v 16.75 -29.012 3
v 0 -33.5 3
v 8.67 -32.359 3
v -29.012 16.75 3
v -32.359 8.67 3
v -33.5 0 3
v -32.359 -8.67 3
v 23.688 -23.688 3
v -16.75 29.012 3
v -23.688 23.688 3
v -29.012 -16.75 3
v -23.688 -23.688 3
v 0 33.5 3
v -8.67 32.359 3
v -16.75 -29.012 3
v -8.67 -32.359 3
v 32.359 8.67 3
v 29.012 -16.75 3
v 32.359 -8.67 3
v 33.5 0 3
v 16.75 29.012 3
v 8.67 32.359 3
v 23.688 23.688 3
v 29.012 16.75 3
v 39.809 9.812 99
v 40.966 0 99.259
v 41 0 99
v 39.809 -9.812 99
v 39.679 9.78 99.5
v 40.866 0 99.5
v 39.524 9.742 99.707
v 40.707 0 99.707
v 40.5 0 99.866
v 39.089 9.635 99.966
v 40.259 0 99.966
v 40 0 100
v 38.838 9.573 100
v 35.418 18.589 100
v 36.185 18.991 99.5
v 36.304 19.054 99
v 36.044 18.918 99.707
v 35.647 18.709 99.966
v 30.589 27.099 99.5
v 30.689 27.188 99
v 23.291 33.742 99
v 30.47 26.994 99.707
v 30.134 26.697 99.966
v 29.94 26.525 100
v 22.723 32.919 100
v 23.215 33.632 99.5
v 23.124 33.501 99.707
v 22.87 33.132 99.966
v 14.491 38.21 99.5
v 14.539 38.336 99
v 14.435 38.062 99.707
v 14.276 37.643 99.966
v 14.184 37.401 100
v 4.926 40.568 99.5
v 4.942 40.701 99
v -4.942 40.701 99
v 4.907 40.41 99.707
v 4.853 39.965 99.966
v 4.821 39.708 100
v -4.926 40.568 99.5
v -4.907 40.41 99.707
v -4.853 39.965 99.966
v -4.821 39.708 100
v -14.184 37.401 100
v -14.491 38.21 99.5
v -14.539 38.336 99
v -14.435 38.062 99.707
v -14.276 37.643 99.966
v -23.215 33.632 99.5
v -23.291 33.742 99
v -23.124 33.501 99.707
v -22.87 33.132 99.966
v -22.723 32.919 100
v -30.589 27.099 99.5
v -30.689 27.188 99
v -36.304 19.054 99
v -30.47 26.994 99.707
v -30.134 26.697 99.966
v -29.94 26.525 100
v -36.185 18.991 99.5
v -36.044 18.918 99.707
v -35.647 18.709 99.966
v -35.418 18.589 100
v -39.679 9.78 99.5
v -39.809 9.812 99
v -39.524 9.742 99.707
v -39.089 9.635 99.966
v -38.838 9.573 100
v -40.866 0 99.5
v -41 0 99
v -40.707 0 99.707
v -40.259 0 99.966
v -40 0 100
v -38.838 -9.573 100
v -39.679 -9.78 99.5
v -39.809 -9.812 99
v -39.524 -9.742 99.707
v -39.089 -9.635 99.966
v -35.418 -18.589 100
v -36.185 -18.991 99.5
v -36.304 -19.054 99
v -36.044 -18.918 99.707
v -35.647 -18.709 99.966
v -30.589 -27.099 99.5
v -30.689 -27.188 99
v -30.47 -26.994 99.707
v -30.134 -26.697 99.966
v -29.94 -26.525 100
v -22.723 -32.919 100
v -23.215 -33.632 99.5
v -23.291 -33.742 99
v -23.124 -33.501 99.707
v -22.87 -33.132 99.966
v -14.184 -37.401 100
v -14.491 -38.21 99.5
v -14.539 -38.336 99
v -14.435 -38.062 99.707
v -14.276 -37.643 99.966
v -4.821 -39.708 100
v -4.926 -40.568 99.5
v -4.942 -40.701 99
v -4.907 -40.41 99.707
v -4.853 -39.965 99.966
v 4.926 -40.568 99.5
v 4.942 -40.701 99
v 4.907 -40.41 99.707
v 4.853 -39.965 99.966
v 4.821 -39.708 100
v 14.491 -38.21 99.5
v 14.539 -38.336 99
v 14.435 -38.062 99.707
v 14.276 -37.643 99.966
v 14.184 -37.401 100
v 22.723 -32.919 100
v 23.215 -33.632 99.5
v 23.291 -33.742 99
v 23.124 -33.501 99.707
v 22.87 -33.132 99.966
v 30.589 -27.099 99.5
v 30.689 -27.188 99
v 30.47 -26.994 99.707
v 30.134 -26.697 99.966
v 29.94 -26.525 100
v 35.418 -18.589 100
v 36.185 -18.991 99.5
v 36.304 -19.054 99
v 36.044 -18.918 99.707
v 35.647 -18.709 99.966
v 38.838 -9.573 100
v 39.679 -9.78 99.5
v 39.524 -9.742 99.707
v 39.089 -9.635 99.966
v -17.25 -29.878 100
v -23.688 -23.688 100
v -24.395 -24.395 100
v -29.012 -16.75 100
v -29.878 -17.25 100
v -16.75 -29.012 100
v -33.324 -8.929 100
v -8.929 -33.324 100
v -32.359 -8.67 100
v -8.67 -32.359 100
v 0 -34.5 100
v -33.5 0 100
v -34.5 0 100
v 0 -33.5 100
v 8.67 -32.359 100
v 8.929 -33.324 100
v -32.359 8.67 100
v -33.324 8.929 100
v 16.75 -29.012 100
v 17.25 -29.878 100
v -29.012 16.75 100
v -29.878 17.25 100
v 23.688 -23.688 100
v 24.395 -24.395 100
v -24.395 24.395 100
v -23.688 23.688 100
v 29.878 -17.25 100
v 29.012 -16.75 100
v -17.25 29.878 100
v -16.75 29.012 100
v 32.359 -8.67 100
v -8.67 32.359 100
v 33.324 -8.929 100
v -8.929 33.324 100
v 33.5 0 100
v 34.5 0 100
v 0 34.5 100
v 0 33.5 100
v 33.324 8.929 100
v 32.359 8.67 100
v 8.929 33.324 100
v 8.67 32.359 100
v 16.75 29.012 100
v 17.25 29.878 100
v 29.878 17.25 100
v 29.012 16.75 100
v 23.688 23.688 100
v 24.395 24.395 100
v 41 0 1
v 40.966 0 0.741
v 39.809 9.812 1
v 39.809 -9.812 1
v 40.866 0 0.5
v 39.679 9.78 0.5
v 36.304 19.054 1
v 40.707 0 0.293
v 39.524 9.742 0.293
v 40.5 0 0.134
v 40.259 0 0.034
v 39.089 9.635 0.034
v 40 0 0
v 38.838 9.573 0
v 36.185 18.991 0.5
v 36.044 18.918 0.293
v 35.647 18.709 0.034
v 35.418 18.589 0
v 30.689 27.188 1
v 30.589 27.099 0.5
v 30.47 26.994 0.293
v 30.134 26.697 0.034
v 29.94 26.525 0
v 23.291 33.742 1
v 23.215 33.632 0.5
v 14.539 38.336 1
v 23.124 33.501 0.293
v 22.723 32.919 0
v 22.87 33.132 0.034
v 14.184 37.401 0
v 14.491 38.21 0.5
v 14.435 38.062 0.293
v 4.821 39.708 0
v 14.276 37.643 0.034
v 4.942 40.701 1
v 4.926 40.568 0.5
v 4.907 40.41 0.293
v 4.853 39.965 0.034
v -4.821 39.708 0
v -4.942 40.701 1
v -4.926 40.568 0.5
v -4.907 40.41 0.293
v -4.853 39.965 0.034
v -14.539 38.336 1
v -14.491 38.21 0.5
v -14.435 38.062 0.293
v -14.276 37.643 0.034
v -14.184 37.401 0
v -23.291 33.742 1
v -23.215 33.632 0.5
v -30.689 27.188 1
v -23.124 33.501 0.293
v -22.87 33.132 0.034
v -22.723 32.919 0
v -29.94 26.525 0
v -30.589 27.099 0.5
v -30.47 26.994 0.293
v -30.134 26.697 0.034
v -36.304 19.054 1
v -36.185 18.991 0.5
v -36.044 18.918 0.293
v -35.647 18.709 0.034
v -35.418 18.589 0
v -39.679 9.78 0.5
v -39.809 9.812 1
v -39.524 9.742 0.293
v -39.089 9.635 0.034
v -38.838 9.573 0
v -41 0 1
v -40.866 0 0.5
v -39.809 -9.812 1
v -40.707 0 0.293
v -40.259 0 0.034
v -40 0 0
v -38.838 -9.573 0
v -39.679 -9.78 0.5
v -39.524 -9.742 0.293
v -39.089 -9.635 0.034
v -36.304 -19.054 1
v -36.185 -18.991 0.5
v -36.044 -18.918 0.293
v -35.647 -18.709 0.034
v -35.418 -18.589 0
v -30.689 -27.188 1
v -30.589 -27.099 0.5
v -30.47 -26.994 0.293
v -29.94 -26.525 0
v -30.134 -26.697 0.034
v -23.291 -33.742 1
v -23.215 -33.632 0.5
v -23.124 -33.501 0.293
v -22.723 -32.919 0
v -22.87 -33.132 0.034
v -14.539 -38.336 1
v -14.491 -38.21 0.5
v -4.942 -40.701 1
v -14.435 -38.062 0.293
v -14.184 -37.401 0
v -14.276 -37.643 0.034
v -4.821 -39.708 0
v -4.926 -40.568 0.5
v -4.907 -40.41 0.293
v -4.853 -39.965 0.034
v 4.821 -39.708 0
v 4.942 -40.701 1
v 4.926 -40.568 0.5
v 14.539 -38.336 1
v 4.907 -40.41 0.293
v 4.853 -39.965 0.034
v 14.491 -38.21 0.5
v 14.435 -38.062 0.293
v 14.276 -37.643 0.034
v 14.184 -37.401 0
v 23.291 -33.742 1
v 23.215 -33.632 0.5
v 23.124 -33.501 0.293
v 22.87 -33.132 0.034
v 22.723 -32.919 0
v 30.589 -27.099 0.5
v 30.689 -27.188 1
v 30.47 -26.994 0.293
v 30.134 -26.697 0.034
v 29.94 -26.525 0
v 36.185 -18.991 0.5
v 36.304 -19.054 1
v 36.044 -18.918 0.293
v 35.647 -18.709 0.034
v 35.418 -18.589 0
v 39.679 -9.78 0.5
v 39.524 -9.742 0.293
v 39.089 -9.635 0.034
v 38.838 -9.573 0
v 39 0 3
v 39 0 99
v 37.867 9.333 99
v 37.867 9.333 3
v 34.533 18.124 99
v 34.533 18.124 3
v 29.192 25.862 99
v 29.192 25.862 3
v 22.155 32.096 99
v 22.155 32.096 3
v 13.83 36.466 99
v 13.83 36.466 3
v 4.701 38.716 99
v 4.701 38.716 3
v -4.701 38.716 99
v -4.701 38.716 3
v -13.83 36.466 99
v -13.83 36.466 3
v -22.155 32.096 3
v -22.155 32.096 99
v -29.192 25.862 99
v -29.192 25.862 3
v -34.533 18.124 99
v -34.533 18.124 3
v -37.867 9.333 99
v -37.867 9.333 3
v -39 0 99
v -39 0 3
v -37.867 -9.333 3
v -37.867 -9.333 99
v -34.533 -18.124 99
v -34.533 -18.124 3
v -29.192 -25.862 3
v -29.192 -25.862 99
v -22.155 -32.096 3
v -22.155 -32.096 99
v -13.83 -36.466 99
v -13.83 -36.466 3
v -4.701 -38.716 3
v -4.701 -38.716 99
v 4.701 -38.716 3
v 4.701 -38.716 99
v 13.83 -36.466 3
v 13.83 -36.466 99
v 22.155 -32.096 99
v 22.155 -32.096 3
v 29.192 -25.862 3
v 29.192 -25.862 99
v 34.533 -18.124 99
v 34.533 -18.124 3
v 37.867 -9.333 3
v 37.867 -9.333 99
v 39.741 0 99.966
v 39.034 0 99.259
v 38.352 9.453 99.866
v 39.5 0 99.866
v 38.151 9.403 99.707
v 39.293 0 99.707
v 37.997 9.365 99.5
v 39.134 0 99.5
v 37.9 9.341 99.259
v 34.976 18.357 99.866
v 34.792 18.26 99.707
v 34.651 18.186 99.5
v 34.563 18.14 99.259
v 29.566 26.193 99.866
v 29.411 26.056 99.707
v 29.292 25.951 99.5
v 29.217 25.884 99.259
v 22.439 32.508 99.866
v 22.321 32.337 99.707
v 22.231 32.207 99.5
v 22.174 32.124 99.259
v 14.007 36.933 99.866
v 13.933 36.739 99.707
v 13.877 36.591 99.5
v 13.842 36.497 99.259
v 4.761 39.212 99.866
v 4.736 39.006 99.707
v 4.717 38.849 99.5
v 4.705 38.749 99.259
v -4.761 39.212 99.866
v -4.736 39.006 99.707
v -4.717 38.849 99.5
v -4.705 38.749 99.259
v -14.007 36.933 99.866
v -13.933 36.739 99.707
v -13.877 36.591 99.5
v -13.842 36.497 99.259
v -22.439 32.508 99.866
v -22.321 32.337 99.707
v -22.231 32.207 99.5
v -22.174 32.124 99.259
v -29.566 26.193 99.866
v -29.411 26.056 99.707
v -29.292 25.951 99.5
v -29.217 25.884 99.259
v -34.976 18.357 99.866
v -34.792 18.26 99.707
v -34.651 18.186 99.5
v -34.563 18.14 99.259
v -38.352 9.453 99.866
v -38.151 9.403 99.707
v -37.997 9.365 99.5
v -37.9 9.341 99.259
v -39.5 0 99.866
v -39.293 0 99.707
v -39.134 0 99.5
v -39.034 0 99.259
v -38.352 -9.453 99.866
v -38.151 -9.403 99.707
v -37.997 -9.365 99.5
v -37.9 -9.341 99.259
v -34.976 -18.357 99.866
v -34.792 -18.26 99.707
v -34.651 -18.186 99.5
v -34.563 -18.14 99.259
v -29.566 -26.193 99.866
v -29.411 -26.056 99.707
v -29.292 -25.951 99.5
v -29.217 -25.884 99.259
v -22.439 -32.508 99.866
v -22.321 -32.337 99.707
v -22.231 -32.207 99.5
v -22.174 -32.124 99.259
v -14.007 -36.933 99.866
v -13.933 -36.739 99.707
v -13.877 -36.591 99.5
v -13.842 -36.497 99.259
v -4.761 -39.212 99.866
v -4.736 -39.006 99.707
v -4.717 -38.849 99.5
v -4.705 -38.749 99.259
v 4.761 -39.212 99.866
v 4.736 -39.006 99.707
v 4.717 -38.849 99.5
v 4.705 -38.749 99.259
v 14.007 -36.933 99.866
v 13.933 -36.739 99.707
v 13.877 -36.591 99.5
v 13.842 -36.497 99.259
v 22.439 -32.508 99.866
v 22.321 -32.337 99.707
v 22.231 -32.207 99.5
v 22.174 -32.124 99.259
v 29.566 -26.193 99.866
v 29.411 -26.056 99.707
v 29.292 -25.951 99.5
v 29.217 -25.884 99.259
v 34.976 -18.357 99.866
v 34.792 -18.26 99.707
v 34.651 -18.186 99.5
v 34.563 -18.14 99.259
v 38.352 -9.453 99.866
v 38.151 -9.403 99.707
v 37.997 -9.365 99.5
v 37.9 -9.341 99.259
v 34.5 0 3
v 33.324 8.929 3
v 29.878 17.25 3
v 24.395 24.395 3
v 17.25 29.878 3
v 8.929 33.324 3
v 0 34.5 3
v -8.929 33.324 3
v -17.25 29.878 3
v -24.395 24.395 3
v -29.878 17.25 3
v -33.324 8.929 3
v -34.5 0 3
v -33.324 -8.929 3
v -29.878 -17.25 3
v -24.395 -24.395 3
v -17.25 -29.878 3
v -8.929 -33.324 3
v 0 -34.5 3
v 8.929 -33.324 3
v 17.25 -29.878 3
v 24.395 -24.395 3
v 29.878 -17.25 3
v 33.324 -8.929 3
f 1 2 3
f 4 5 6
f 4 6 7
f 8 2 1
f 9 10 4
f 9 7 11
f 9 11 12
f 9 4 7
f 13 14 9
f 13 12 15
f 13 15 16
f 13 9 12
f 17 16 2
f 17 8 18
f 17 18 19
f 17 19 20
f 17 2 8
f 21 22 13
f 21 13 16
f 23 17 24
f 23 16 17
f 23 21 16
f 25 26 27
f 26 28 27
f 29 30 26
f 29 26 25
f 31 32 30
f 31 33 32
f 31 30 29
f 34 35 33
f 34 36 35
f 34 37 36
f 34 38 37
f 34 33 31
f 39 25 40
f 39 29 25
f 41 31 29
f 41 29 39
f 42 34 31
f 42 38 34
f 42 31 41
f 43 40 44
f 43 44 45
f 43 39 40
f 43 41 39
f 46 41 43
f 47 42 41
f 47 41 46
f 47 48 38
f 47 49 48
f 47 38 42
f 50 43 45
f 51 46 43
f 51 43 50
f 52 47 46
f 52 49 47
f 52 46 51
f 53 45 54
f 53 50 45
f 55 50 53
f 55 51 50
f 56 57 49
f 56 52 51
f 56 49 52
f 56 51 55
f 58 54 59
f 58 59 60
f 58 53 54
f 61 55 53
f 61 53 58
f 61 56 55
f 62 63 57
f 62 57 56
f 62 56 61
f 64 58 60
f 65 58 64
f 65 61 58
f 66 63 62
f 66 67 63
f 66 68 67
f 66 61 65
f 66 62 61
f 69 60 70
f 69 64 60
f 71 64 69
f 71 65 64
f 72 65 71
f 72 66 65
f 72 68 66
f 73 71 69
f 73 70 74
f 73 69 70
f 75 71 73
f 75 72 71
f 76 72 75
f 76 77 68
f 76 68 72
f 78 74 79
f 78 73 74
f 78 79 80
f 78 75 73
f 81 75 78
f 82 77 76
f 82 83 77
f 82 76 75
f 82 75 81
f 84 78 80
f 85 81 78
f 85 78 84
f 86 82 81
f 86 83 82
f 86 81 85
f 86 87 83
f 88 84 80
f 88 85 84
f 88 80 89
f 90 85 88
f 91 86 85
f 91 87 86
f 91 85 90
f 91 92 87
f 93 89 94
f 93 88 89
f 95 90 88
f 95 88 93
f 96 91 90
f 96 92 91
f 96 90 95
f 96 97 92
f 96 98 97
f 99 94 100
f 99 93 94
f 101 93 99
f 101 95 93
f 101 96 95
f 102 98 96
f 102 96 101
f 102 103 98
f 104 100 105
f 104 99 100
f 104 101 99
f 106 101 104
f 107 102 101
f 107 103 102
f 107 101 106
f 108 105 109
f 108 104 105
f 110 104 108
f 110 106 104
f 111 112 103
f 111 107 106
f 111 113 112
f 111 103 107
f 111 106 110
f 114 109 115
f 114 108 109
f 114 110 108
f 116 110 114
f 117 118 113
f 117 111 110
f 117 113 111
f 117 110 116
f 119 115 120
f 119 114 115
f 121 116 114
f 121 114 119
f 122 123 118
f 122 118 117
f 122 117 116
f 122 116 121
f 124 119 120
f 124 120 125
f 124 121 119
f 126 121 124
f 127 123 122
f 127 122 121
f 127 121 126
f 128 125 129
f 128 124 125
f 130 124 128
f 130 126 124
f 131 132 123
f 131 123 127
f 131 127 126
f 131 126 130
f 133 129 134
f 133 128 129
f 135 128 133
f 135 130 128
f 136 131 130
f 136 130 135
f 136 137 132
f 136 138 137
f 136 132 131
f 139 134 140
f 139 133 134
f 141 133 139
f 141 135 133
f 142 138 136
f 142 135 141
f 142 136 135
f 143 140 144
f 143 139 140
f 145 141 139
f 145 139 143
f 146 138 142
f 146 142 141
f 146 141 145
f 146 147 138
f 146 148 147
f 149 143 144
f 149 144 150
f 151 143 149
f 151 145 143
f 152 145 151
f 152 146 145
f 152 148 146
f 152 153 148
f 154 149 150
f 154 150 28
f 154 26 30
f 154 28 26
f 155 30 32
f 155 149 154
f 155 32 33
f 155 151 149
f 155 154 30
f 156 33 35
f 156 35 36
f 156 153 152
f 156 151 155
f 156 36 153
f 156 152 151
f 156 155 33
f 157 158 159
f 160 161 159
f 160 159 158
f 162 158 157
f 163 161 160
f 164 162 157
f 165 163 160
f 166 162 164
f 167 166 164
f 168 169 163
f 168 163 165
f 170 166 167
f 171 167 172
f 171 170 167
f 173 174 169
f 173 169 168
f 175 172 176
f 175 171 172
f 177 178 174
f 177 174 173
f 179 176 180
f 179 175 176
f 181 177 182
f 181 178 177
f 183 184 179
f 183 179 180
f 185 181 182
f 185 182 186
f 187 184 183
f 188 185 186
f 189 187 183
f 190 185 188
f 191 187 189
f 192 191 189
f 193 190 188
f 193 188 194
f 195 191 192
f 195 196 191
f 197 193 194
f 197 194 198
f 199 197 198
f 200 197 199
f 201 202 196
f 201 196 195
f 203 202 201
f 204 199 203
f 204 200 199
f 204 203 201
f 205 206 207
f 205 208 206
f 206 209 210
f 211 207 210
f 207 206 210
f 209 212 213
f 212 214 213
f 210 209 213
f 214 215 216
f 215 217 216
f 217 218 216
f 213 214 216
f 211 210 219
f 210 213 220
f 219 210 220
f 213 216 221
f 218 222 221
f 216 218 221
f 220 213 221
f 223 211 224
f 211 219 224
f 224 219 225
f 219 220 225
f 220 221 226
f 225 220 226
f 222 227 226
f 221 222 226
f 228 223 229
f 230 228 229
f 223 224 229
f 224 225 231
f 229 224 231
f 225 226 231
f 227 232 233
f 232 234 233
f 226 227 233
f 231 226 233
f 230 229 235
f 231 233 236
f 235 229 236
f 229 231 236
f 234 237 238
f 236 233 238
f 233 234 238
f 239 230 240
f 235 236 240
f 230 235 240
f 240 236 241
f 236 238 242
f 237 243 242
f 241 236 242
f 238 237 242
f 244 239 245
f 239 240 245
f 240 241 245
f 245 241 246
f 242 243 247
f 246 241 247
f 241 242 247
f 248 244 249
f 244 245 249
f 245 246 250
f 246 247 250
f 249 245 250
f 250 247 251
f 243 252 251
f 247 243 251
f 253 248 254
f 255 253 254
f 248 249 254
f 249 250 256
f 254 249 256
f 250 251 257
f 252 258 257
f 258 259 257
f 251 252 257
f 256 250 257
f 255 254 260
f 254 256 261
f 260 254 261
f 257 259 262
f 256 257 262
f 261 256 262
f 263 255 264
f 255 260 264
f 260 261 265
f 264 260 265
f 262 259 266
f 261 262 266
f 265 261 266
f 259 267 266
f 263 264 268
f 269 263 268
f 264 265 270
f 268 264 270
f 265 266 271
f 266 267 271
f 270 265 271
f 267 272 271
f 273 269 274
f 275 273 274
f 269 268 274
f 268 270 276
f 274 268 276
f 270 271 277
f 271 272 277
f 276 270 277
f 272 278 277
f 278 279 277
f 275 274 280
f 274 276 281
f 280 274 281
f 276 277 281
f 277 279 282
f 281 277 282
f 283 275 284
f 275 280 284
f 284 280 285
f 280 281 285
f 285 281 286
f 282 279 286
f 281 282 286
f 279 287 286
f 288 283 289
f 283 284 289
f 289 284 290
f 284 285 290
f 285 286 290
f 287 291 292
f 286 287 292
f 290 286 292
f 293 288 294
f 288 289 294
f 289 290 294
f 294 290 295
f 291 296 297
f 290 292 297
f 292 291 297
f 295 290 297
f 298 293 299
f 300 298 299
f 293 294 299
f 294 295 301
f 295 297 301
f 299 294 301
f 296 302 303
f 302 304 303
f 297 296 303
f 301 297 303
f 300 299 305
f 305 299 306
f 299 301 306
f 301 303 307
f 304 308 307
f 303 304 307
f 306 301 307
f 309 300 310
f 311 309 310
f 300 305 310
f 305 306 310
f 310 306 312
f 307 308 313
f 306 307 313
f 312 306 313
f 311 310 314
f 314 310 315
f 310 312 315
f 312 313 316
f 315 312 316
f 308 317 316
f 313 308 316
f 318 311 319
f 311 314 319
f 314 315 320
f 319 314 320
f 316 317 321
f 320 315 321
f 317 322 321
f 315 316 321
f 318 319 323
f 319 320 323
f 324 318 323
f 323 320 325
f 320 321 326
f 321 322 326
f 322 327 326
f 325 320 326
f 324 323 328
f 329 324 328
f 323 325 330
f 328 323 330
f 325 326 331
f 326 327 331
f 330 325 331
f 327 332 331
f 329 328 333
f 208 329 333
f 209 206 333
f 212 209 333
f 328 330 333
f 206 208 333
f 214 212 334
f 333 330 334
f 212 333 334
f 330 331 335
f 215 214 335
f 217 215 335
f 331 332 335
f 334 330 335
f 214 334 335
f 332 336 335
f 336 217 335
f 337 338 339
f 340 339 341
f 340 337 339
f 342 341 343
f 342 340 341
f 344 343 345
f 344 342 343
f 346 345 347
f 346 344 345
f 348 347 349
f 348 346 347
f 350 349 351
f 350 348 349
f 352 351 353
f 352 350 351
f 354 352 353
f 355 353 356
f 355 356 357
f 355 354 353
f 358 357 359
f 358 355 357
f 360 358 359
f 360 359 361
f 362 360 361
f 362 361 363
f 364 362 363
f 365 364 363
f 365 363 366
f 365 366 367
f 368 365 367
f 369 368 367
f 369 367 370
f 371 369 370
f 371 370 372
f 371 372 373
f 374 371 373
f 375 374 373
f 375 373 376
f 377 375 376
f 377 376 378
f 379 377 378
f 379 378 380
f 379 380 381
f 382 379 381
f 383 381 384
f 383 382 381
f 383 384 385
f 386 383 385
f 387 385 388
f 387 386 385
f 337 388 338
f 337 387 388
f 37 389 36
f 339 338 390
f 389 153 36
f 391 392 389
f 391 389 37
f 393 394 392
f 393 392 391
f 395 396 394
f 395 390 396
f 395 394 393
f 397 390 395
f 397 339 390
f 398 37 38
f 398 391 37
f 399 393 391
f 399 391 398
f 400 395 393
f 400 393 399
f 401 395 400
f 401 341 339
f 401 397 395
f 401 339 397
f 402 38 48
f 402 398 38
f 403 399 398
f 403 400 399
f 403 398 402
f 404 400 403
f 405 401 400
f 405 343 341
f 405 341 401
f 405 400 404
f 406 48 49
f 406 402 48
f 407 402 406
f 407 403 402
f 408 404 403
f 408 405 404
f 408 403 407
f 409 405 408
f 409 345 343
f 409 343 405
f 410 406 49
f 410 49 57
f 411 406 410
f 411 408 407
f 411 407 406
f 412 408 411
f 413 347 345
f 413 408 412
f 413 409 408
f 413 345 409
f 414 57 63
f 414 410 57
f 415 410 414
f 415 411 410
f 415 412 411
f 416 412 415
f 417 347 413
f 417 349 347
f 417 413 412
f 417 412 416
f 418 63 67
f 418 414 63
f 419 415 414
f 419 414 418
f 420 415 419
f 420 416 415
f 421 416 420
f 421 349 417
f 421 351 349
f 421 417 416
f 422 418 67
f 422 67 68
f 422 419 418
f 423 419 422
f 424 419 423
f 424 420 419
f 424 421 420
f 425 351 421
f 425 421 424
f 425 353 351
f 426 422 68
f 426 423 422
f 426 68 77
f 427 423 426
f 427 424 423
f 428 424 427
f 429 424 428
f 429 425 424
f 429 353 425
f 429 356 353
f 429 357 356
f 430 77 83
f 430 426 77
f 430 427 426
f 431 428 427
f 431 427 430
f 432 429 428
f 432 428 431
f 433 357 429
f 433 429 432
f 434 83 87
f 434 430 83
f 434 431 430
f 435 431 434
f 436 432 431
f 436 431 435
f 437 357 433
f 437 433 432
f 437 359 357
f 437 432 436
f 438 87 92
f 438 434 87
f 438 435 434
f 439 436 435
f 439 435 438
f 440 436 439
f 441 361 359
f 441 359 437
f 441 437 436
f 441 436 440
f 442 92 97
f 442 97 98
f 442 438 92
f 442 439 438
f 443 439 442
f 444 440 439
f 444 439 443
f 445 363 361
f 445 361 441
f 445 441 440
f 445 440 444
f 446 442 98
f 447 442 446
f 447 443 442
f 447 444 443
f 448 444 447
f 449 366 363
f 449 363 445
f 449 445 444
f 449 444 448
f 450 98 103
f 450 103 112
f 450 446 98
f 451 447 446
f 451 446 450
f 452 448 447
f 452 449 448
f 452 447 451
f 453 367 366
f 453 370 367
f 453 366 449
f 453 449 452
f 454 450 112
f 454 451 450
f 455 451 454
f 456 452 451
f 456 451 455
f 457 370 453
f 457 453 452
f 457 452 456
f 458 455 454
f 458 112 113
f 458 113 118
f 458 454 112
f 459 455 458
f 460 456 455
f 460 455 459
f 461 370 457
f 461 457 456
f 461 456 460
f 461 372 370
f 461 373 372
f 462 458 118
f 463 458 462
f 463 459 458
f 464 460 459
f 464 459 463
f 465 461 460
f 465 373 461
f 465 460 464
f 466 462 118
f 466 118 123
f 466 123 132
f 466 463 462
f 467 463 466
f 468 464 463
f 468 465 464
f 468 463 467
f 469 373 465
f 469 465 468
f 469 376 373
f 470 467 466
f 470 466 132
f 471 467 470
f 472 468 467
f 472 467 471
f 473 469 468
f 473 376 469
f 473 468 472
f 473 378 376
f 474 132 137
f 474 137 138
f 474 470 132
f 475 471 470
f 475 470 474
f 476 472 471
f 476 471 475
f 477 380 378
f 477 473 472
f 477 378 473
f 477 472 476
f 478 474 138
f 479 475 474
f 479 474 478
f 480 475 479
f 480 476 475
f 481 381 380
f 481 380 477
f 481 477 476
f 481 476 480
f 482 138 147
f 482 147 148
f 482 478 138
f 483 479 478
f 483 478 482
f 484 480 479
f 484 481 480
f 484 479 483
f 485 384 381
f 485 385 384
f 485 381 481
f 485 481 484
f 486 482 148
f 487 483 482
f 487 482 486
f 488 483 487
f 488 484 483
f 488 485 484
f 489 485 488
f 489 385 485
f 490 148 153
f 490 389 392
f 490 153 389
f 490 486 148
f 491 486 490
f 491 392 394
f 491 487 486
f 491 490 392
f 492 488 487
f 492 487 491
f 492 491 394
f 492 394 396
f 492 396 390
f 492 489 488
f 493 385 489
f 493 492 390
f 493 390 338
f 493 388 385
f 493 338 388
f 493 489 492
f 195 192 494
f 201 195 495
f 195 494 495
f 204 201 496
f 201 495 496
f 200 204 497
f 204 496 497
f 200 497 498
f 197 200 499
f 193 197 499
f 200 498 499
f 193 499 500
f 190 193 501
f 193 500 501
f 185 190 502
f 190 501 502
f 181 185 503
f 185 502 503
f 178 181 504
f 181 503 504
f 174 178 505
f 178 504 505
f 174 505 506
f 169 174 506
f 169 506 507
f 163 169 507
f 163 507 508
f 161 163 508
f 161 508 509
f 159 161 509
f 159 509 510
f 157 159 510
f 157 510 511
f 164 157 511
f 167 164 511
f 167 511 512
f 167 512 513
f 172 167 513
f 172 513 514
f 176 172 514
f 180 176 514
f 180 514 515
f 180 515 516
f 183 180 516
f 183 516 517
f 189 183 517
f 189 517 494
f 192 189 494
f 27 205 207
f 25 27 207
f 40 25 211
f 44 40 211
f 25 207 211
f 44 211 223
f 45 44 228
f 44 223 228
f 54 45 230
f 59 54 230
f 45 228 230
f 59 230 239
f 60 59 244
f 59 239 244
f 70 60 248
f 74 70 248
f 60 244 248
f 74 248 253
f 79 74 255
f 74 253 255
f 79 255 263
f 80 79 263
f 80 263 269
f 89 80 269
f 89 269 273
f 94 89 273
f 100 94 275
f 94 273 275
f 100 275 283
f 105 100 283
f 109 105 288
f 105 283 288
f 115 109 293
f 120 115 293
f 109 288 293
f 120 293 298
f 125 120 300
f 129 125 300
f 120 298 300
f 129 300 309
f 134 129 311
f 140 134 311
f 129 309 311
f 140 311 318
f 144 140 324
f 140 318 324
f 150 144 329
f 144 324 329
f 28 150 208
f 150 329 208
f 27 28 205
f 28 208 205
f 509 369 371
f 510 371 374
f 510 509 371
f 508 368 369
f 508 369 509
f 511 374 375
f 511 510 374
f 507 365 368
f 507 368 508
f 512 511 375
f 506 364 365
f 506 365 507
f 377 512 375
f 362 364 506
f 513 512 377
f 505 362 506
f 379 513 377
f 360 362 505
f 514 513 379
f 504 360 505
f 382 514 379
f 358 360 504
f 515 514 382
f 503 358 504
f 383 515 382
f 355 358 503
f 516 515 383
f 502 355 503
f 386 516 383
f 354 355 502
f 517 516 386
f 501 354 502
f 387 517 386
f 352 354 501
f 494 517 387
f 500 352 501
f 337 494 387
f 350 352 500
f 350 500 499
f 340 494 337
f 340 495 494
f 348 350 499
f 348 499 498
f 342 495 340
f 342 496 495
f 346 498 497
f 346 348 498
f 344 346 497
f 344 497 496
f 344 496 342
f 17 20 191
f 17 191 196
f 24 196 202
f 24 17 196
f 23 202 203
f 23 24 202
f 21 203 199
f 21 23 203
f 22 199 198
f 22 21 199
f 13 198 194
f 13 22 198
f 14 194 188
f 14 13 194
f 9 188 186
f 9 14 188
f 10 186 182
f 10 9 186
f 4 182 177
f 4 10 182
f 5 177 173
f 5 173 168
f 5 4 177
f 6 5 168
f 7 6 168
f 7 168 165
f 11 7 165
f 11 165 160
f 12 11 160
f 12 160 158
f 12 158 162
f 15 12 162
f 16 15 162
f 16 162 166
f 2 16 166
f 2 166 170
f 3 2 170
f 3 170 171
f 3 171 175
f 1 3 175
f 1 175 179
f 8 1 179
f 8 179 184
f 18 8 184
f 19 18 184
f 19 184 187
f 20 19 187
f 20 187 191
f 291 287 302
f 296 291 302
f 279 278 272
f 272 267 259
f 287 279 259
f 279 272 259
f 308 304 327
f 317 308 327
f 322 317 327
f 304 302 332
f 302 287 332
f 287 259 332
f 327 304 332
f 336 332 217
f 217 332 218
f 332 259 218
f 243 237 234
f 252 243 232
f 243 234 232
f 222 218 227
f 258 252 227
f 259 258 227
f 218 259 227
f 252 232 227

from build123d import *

# Parameters (mm, degrees)
F0_R     = 33.5
F1_DEPTH = 3
F2_R     = 34.5
F2_R_2   = 33.5
F3_DEPTH = 100
F4_R     = 41
F5_DEPTH = 3
F6_R     = 41
F6_R_2   = 39
F7_DEPTH = 100
F8_R     = 1
F9_R     = 0.99999


# Not quite as in the source:
# - a fillet or chamfer is up to 0.001 mm smaller than in the source, because OpenCascade refuses the exact size


with BuildPart() as f1:
    # F0 (on Top) → F1 (new body)
    with BuildSketch(Plane.XY):
        Circle(F0_R)
    extrude(amount=F1_DEPTH)

    # F2 (on Top) → F3 (join)
    with BuildSketch(Plane.XY):
        Circle(F2_R)
        Circle(F2_R_2, mode=Mode.SUBTRACT)
    extrude(amount=F3_DEPTH)

    # F4 (on Top) → F5 (join)
    with BuildSketch(Plane.XY):
        Circle(F4_R)
    extrude(amount=F5_DEPTH)

    # F6 (on Top) → F7 (join)
    with BuildSketch(Plane.XY):
        Circle(F6_R)
        Circle(F6_R_2, mode=Mode.SUBTRACT)
    extrude(amount=F7_DEPTH)

    # F8
    f8_edges = [f1.edges().sort_by_distance(p)[0] for p in [
        (-41, 0, 0),
    ]]
    fillet(f8_edges, radius=F8_R)

    # F9 (radius 1 in the source; OpenCascade refuses exactly that, so slightly less here)
    f9_edges = [f1.edges().sort_by_distance(p)[0] for p in [
        (-41, 0, 100),
        (-39, 0, 100),
    ]]
    fillet(f9_edges, radius=F9_R)


solid = f1.part
